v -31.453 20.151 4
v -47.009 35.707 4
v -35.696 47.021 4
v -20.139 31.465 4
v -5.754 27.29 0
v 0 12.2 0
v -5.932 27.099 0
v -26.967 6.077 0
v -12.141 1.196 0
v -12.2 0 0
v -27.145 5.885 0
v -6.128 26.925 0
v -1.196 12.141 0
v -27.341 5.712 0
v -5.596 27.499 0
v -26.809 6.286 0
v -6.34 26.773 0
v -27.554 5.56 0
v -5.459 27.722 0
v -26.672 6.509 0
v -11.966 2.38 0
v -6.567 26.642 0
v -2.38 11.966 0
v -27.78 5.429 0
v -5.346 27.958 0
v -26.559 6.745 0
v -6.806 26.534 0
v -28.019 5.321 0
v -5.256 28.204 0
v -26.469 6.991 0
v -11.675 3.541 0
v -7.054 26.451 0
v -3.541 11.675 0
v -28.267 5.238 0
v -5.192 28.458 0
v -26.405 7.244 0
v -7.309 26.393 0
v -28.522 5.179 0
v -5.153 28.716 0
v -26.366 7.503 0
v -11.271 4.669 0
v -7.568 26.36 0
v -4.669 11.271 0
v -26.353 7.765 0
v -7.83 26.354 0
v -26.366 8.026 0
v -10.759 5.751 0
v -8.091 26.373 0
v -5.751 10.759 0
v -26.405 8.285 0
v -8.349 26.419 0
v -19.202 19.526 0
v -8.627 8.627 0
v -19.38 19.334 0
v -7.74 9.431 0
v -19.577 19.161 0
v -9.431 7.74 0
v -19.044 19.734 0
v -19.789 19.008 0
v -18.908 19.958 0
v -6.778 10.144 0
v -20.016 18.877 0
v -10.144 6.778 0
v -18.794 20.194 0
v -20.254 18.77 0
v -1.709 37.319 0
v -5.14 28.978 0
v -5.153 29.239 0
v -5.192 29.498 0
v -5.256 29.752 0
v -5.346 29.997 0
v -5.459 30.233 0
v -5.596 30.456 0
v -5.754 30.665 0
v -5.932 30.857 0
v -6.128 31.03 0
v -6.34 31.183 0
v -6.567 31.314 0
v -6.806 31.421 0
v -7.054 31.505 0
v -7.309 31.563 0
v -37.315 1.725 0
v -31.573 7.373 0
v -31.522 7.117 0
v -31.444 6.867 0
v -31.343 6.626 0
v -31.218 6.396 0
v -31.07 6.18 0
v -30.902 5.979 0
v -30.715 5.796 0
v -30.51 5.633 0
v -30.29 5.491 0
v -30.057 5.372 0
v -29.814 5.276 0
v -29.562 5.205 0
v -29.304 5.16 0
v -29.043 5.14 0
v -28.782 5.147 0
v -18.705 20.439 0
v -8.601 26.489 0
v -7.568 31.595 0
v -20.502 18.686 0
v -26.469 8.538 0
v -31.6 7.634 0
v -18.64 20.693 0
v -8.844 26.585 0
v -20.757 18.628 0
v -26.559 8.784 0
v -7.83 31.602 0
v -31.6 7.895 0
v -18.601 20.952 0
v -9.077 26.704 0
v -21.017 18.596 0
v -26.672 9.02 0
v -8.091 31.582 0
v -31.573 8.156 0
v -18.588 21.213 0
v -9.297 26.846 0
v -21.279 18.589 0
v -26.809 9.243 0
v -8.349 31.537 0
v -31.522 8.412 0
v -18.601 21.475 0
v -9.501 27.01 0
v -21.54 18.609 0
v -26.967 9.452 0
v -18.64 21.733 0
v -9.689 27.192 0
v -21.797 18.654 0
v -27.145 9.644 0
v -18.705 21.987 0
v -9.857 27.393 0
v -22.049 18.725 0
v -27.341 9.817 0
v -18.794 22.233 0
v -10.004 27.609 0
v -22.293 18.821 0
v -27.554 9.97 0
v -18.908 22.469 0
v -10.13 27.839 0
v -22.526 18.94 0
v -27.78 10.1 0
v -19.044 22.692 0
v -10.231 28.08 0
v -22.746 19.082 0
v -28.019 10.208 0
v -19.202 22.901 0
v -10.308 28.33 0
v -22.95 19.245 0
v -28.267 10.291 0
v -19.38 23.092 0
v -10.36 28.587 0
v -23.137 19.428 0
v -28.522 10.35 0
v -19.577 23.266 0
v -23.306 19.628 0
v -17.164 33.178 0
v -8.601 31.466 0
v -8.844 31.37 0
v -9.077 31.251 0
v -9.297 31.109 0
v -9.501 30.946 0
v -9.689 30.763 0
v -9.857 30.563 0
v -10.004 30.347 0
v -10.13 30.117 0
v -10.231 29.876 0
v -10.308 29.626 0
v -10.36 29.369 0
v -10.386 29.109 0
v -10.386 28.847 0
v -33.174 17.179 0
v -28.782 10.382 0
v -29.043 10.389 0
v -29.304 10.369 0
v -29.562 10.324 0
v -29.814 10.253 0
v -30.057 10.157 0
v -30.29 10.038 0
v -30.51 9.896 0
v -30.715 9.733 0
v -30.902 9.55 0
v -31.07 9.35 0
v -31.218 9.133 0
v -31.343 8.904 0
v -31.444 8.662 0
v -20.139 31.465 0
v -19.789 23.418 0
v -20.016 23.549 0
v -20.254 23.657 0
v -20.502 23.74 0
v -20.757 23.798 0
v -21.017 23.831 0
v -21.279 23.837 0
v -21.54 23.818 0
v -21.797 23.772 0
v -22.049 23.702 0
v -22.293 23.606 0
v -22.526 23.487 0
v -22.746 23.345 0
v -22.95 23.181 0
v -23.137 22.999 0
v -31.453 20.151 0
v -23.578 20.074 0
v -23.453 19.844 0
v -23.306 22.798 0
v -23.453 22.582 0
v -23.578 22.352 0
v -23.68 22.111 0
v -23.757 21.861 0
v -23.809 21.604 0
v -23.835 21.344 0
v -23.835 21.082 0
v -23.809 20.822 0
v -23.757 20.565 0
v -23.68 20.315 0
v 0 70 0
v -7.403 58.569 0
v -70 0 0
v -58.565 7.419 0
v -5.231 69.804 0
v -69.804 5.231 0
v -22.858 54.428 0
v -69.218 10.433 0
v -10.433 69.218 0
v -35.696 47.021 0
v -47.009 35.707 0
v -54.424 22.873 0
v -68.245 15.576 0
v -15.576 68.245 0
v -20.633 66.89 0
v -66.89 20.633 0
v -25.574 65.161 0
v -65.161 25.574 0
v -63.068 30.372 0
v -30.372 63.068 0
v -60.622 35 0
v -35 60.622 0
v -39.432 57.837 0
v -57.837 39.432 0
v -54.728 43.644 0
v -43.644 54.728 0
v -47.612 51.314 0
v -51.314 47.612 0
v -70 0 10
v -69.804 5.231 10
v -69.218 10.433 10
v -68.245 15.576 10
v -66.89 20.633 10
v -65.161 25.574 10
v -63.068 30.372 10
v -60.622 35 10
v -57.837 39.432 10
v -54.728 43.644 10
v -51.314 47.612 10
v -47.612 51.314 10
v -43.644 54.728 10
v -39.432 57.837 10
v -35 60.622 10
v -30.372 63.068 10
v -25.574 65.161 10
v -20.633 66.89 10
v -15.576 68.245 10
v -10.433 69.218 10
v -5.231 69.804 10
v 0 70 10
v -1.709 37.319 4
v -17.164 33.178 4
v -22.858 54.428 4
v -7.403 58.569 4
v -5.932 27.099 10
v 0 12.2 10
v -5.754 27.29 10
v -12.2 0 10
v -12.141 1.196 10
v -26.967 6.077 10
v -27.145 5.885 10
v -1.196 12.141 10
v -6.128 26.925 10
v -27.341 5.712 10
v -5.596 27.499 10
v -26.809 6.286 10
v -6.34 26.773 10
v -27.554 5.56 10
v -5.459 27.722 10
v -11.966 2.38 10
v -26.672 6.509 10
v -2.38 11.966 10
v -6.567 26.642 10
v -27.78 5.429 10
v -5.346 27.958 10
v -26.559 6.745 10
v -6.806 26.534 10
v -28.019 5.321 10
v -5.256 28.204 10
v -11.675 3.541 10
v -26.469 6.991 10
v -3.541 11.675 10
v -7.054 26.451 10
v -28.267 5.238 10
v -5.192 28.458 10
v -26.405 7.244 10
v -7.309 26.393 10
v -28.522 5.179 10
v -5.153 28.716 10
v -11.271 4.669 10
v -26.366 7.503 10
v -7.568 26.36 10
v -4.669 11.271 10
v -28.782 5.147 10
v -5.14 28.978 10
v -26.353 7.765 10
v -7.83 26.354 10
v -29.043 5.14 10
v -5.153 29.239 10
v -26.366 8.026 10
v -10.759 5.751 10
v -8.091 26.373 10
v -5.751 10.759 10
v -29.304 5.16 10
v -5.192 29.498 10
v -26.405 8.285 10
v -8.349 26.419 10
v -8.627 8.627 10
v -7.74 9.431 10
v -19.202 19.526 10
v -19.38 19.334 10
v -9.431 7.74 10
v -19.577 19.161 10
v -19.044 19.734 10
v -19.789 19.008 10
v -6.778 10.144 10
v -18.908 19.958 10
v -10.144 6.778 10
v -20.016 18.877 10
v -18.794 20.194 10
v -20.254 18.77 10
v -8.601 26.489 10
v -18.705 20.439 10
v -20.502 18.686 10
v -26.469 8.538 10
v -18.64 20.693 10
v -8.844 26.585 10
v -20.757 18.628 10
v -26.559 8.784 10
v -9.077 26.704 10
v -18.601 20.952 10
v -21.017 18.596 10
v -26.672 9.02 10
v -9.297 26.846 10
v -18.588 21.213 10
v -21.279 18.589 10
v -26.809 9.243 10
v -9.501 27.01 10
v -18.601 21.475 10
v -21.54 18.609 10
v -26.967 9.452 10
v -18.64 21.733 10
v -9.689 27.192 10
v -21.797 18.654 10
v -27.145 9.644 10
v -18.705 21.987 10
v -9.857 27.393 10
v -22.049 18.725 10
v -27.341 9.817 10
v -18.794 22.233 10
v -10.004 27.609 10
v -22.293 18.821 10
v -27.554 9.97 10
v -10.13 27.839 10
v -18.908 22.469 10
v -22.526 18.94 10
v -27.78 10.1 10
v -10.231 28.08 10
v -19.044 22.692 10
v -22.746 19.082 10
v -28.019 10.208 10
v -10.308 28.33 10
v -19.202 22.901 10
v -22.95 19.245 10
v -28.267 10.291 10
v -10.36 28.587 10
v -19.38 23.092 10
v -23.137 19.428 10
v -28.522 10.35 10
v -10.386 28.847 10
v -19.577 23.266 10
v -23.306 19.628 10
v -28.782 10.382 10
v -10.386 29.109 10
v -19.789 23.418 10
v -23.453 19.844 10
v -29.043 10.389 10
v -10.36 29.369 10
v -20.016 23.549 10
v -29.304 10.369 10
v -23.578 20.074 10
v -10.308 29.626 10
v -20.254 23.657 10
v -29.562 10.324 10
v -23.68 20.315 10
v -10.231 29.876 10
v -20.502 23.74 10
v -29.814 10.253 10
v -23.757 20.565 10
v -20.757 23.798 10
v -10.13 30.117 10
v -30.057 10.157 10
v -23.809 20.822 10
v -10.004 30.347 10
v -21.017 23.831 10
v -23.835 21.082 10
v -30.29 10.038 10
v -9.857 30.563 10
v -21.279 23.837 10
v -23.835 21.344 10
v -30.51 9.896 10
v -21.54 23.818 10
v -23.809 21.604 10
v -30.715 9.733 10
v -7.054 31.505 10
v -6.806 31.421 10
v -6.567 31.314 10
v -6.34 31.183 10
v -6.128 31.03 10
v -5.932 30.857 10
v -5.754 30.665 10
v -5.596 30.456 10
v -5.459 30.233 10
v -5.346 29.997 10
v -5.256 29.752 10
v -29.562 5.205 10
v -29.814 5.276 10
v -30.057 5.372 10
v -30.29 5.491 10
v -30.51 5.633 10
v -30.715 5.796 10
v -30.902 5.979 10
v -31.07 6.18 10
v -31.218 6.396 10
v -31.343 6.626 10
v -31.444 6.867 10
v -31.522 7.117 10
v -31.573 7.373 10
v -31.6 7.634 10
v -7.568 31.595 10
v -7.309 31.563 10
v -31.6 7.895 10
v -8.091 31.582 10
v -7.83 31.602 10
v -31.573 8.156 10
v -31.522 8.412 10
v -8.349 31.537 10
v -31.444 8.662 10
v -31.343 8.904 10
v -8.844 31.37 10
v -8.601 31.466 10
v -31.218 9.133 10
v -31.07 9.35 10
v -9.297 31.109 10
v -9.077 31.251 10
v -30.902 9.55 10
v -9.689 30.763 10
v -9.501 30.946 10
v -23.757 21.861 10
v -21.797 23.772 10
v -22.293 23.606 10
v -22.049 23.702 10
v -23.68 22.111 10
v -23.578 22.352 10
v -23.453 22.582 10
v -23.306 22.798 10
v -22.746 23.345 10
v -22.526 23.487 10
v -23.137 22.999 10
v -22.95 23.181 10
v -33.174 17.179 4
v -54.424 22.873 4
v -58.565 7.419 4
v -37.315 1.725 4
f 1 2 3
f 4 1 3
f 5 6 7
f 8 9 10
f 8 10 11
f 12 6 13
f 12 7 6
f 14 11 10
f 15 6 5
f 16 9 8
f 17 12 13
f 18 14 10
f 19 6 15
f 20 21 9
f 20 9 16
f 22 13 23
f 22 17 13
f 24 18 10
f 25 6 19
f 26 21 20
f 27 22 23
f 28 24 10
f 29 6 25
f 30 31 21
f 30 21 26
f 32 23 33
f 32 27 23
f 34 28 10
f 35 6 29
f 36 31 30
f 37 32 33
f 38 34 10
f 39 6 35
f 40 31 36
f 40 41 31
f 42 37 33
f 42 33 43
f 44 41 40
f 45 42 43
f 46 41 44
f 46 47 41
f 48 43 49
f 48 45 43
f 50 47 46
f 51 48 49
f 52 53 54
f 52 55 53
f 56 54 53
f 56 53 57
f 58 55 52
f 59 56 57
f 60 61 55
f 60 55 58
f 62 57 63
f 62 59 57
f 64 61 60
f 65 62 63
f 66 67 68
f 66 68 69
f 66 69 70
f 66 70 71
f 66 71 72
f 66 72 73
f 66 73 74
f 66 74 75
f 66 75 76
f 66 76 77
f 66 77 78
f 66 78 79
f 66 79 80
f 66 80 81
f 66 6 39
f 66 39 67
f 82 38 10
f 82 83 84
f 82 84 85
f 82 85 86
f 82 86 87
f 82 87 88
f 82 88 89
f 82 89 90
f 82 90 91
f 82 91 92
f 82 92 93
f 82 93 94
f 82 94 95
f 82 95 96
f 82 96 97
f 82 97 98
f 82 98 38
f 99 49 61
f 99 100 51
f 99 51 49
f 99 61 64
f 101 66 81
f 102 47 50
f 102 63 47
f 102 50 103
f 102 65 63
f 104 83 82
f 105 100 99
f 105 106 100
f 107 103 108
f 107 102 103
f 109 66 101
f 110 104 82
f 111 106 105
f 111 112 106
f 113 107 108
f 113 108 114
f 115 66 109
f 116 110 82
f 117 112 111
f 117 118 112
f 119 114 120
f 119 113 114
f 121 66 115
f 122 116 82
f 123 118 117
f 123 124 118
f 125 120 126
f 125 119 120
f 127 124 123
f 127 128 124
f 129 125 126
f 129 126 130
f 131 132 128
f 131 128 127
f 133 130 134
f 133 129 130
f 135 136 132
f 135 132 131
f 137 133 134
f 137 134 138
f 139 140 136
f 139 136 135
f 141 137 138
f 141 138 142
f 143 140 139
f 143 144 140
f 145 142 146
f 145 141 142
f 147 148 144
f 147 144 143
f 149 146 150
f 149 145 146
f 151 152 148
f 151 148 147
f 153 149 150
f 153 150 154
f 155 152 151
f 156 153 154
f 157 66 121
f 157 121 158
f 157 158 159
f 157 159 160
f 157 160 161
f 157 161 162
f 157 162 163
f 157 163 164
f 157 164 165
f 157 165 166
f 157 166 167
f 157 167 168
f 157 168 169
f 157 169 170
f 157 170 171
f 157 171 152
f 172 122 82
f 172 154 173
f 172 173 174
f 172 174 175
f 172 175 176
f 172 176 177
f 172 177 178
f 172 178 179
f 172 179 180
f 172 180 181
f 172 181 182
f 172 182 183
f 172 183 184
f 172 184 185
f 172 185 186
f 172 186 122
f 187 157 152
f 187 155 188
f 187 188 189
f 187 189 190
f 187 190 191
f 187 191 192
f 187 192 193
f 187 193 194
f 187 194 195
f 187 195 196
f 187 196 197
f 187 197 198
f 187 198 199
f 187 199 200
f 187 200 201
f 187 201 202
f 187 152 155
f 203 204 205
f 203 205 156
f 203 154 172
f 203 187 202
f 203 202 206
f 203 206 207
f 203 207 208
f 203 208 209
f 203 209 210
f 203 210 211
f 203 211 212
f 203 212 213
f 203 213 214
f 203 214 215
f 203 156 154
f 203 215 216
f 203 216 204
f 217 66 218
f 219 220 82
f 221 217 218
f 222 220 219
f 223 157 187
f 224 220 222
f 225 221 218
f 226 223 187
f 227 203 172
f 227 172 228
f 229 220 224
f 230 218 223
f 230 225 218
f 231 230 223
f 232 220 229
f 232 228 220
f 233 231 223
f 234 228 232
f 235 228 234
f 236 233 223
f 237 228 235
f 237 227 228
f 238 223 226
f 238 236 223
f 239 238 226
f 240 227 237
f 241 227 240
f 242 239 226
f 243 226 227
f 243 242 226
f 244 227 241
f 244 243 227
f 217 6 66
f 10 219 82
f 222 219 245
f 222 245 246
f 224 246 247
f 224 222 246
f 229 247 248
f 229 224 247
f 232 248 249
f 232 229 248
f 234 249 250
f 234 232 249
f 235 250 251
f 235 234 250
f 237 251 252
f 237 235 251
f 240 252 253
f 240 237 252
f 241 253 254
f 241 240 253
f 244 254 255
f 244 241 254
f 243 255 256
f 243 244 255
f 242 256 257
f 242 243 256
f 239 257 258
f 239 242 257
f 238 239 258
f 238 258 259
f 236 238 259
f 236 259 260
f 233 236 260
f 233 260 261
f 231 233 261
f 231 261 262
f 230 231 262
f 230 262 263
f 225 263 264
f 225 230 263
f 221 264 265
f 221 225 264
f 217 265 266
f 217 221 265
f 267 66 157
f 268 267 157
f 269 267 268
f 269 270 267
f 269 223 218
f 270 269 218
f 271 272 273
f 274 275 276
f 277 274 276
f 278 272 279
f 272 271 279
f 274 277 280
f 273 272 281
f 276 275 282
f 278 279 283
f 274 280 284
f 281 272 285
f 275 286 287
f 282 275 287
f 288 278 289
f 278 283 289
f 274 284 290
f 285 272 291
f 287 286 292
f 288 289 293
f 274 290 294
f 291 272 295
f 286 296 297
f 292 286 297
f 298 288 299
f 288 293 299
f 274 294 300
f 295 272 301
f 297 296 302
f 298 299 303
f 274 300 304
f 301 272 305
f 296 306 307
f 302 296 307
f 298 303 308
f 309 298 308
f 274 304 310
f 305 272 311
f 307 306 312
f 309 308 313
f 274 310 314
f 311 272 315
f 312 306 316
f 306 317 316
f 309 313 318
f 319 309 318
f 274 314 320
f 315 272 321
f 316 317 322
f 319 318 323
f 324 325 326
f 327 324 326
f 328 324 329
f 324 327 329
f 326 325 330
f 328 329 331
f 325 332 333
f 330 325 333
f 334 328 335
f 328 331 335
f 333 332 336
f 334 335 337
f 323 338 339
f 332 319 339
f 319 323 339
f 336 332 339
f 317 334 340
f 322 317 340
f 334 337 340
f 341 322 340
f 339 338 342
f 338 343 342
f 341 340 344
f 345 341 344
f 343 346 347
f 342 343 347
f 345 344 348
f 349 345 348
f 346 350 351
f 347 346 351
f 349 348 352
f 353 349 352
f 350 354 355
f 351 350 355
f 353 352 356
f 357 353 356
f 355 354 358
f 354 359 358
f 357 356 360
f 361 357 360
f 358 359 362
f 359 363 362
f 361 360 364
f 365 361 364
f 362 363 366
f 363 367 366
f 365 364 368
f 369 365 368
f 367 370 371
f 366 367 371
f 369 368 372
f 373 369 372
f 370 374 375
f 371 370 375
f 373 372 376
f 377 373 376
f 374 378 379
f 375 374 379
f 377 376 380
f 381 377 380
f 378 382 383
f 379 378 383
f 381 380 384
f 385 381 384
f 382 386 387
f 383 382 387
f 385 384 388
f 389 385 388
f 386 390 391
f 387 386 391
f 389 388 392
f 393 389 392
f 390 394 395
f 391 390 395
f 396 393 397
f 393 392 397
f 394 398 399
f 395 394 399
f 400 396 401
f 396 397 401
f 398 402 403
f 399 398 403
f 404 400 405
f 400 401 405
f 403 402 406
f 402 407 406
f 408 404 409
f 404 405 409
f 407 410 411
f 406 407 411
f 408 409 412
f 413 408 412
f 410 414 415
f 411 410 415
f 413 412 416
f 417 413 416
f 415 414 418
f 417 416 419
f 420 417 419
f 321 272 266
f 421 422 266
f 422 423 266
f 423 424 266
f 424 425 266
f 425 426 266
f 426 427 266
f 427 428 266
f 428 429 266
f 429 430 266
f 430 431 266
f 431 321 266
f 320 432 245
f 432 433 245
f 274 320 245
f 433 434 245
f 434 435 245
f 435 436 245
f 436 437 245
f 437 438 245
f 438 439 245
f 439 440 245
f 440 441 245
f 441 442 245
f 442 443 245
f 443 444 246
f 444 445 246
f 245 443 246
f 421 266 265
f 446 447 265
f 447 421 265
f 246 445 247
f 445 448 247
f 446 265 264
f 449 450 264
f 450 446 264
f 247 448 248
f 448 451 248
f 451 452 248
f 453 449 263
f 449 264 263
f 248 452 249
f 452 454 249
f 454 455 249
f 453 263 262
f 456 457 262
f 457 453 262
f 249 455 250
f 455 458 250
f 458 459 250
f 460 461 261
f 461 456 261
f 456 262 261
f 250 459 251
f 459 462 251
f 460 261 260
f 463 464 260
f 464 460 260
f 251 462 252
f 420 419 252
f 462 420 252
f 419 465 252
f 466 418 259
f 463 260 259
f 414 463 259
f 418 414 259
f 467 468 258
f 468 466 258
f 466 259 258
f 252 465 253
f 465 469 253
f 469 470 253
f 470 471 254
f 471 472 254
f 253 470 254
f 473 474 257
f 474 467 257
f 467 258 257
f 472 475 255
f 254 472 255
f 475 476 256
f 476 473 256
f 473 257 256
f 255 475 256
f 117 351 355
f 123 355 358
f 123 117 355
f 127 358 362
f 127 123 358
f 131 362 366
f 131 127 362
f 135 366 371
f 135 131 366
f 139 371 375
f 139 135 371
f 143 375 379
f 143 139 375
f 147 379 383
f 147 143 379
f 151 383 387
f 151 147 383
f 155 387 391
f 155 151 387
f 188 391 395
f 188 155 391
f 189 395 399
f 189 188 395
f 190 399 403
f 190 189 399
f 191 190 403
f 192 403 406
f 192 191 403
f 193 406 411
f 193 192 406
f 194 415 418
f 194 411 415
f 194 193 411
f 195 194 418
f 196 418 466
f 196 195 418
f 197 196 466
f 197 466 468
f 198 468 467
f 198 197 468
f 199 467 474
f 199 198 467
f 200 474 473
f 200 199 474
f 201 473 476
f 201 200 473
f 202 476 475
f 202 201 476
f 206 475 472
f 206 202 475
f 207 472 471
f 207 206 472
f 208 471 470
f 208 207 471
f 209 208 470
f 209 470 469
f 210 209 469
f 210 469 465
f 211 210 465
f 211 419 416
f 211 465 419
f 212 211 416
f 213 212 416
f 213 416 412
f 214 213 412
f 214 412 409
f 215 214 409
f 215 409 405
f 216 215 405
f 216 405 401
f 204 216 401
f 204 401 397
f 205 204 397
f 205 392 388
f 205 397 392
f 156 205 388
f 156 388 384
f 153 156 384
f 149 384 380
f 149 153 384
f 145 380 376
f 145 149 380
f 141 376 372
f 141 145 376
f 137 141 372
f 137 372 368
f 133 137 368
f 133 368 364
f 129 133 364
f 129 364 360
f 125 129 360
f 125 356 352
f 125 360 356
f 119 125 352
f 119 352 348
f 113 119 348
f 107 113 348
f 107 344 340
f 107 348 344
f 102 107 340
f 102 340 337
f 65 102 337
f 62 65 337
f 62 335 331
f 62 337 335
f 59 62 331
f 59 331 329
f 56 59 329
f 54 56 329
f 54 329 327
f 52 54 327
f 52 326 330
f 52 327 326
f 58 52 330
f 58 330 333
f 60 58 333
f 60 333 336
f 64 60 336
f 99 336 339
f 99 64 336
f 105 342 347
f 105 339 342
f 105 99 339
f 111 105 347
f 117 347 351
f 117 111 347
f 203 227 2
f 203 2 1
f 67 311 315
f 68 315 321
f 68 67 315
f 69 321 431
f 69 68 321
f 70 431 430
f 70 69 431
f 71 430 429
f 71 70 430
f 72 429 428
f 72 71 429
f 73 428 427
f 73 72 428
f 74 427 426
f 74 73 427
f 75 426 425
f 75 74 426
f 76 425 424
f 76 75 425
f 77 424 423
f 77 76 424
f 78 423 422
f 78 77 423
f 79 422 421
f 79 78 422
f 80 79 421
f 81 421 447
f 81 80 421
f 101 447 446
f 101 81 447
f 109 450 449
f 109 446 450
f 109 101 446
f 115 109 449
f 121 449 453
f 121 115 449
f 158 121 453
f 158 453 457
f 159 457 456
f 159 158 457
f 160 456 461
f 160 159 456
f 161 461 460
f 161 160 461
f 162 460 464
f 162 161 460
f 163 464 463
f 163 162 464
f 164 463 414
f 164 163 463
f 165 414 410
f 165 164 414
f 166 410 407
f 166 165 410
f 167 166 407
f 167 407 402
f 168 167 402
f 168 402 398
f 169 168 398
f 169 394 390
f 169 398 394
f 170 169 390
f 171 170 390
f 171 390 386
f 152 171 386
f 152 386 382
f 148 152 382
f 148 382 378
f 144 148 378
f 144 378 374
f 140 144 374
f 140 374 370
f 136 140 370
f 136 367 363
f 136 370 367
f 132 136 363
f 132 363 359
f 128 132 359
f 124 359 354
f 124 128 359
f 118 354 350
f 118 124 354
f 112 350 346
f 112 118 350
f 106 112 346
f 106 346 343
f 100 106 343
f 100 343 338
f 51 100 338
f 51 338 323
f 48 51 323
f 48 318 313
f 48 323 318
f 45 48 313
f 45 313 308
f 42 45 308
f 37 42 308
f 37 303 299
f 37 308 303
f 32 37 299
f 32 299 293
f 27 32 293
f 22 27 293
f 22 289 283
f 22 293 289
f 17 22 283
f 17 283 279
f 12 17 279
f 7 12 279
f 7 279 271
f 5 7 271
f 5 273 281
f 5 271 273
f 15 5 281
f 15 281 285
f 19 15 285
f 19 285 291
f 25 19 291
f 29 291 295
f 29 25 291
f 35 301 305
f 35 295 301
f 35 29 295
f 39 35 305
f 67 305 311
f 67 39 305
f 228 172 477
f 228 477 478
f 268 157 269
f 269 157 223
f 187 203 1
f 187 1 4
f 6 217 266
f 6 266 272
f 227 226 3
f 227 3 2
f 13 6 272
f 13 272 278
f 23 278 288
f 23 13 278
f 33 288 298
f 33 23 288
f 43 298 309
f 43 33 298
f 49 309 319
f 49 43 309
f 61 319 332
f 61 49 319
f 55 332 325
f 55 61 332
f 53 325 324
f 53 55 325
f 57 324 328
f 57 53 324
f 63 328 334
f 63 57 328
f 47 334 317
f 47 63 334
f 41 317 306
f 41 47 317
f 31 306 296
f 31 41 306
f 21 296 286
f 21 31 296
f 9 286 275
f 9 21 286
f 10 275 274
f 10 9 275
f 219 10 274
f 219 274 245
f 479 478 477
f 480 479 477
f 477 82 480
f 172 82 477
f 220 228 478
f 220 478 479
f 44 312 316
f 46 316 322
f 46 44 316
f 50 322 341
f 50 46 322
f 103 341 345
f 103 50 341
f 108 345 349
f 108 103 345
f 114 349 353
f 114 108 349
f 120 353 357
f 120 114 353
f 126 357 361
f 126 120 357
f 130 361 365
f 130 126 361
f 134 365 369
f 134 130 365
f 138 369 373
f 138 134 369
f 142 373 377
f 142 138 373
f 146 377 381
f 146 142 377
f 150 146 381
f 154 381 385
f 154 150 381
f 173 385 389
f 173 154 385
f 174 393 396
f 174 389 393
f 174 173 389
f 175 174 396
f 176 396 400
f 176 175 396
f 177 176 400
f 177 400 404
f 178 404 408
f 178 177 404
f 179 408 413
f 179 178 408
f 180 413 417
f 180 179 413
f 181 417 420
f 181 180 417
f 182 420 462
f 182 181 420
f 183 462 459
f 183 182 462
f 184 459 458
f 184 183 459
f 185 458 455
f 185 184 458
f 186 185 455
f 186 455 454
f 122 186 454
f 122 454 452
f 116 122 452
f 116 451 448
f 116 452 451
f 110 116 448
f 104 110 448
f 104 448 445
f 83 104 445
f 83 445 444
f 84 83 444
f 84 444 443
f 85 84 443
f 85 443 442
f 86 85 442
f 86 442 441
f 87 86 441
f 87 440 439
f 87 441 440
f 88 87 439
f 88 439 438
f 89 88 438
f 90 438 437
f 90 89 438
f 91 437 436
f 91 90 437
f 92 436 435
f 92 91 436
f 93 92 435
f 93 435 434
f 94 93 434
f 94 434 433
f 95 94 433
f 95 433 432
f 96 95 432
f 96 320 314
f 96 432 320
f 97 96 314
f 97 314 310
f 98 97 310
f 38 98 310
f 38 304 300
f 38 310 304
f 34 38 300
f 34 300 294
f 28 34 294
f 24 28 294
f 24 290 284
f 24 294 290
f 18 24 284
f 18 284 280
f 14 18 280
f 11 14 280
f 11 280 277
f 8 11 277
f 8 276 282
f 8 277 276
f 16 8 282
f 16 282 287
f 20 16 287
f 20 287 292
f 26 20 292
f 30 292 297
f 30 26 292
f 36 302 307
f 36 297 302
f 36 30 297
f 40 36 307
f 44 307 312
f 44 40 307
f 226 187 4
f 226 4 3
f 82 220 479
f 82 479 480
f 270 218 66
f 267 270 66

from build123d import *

# Parameters (mm, degrees)
BOSS_EXTRUDE1_DEPTH = 10
SKETCH2_R           = 2.625
CUT_EXTRUDE1_DEPTH  = 100.49874371
SKETCH3_R           = 12.2
CUT_EXTRUDE2_DEPTH  = 20
CUT_EXTRUDE3_DEPTH  = 4


with BuildPart() as part:
    # Sketch1 → Boss-Extrude1 (new body)
    with BuildSketch(Plane.XY):
        with BuildLine():
            Line((0, 70), (0, 0))
            Line((0, 0), (-70, 0))
            ThreePointArc((-70, 0), (-49.497474683, 49.497474683), (0, 70))
        make_face()
    extrude(amount=BOSS_EXTRUDE1_DEPTH)

    # Sketch2 → Cut-Extrude1 (cut, through all)
    with BuildSketch(Plane.XY):
        with Locations((-7.76457135, 28.97777479)):
            Circle(SKETCH2_R)
        with Locations((-21.213203434, 21.213203438)):
            Circle(SKETCH2_R)
        with Locations((-28.977774788, 7.764571356)):
            Circle(SKETCH2_R)
    extrude(amount=CUT_EXTRUDE1_DEPTH, mode=Mode.SUBTRACT)

    # Sketch3 → Cut-Extrude2 (cut)
    with BuildSketch(Plane.XY):
        Circle(SKETCH3_R)
    extrude(amount=CUT_EXTRUDE2_DEPTH, mode=Mode.SUBTRACT)

    # Sketch4 → Cut-Extrude3 (cut)
    with BuildSketch(Plane.XY):
        Polygon((-20.139437084, 31.464597344), (-35.69578627, 47.02094653), (-47.009494769, 35.707238031), (-31.453145583, 20.150888845), align=None)
        Polygon((-1.708965461, 37.318859162), (-17.163778681, 33.17775444), (-22.857797674, 54.428122618), (-7.402984453, 58.56922734), align=None)
        Polygon((-33.173562805, 17.179422078), (-54.423930983, 22.87344107), (-58.565035705, 7.418627849), (-37.314667526, 1.724608857), align=None)
    extrude(amount=CUT_EXTRUDE3_DEPTH, mode=Mode.SUBTRACT)


solid = part.part
